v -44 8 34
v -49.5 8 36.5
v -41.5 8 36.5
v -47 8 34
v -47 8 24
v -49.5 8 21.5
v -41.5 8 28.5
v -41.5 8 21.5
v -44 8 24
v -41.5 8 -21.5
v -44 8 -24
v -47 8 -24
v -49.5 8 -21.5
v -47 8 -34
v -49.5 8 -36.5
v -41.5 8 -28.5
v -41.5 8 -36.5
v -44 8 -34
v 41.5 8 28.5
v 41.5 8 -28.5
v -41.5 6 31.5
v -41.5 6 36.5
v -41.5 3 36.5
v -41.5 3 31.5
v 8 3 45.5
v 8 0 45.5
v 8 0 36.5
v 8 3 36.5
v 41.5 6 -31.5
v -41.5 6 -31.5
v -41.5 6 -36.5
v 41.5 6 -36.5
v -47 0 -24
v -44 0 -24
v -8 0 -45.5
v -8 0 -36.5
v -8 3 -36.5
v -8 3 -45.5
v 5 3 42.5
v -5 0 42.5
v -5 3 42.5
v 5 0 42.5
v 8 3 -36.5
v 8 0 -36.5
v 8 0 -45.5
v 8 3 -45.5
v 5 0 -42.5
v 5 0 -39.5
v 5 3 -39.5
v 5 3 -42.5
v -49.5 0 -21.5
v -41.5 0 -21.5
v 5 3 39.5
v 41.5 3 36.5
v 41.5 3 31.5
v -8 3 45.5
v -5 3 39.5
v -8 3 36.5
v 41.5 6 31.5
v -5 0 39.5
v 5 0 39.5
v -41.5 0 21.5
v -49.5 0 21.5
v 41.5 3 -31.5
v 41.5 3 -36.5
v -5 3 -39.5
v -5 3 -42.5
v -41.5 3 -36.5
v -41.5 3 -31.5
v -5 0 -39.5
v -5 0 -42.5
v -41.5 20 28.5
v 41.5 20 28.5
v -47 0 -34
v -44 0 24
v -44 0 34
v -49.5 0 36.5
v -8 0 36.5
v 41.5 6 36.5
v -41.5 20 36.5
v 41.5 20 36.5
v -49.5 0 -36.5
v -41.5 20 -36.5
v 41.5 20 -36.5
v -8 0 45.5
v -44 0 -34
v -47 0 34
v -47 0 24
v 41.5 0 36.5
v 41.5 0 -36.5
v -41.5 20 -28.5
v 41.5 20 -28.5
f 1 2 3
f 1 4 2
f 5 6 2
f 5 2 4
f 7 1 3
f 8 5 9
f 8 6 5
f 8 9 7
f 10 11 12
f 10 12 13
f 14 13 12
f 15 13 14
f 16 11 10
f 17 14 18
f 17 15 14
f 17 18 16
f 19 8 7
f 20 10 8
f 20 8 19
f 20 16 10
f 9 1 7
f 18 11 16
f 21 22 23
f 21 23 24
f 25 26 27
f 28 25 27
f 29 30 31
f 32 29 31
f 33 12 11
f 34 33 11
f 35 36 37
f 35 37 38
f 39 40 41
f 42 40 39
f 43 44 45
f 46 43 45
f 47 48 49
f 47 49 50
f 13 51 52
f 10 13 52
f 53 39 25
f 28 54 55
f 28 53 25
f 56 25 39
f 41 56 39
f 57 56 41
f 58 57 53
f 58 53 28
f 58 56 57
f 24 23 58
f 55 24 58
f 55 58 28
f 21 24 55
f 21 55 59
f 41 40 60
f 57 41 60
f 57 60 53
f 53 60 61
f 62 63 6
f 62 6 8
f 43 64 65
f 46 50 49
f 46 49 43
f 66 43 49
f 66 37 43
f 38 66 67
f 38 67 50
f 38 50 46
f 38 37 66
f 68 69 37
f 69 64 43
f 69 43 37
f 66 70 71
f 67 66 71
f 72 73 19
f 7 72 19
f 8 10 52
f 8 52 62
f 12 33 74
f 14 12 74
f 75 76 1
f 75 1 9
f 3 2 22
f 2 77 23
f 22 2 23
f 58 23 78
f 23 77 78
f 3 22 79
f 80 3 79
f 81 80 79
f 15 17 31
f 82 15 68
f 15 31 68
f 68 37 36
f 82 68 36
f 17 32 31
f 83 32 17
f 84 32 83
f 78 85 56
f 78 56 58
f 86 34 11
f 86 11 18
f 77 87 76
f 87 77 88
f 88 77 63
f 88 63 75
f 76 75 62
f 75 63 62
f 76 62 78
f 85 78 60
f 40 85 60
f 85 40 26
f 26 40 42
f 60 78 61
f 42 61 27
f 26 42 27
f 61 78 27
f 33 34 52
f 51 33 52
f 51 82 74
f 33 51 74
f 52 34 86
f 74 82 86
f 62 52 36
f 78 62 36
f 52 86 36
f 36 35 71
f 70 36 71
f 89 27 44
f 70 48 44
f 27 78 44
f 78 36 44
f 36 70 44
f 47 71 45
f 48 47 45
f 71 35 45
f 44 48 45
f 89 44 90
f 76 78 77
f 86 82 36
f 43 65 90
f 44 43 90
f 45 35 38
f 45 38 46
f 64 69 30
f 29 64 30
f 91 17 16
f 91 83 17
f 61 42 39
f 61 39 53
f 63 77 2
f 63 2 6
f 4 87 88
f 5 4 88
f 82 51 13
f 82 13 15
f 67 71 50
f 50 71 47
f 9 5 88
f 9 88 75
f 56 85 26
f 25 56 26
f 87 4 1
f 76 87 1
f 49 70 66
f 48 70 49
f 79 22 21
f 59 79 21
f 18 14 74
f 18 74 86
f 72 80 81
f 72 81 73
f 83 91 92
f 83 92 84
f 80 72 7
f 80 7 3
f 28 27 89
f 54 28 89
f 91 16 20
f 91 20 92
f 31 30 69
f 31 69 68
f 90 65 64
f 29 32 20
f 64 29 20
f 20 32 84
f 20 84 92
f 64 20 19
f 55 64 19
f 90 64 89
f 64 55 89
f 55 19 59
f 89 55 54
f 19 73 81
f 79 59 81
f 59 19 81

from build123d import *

# Parameters (mm, degrees)
BOSS_EXTRUDE1_DEPTH     = 41.5
SKETCH3_W               = 8
SKETCH3_H               = 15
SKETCH3_W_2             = 3
SKETCH3_H_2             = 10
BOSS_EXTRUDE2_DEPTH     = 8
SKETCH3_3_W             = 16
SKETCH3_3_H             = 9
SKETCH3_3_W_2           = 10
SKETCH3_3_H_2           = 3
BOSS_EXTRUDE3_DEPTH     = 3
CUT_EXTRUDE1_DEPTH      = 104.688234627
CUT_EXTRUDE1_DEPTH_BACK = 83
SKETCH4_W               = 5
SKETCH4_H               = 3


with BuildPart() as part:
    # Sketch2 → Boss-Extrude1 (new, symmetric)
    with BuildSketch(Plane(origin=(0, 0, 0), x_dir=(0, 0, -1), z_dir=(1, 0, 0))):
        Polygon((-28.5, 8), (28.5, 8), (28.5, 20), (36.5, 20), (36.5, 0), (-36.5, 0), (-36.5, 20), (-28.5, 20), align=None)
    extrude(amount=BOSS_EXTRUDE1_DEPTH, both=True)

    # Sketch3 → Boss-Extrude2 (add)
    # profile 1 of 2: a face of its own
    with BuildSketch(Plane(origin=(0, 0, 0), x_dir=(1, 0, 0), z_dir=(0, 1, 0))):
        with Locations((-45.5, -29)):
            Rectangle(SKETCH3_W, SKETCH3_H)
        with Locations((-45.5, -29)):
            Rectangle(SKETCH3_W_2, SKETCH3_H_2, mode=Mode.SUBTRACT)
    # profile 2 of 2: a face of its own
    with BuildSketch(Plane(origin=(0, 0, 0), x_dir=(1, 0, 0), z_dir=(0, 1, 0))):
        with Locations((-45.5, 29)):
            Rectangle(SKETCH3_W, SKETCH3_H)
        with Locations((-45.5, 29)):
            Rectangle(SKETCH3_W_2, SKETCH3_H_2, mode=Mode.SUBTRACT)
    extrude(amount=BOSS_EXTRUDE2_DEPTH)

    # Sketch3<3> → Boss-Extrude3 (add)
    # profile 1 of 2: a face of its own
    with BuildSketch(Plane(origin=(0, 0, 0), x_dir=(1, 0, 0), z_dir=(0, 1, 0))):
        with Locations((0, -41)):
            Rectangle(SKETCH3_3_W, SKETCH3_3_H)
        with Locations((0, -41)):
            Rectangle(SKETCH3_3_W_2, SKETCH3_3_H_2, mode=Mode.SUBTRACT)
    # profile 2 of 2: a face of its own
    with BuildSketch(Plane(origin=(0, 0, 0), x_dir=(1, 0, 0), z_dir=(0, 1, 0))):
        with Locations((0, 41)):
            Rectangle(SKETCH3_3_W, SKETCH3_3_H)
        with Locations((0, 41)):
            Rectangle(SKETCH3_3_W_2, SKETCH3_3_H_2, mode=Mode.SUBTRACT)
    extrude(amount=BOSS_EXTRUDE3_DEPTH)

    # Sketch4 → Cut-Extrude1 (cut, two sides: drawn at the far end of the back side and taken through both)
    with BuildSketch(Plane(origin=(41.5, 0, 0), x_dir=(0, 0, -1), z_dir=(1, 0, 0)).offset(-CUT_EXTRUDE1_DEPTH_BACK)):
        with Locations((-34, 4.5)):
            Rectangle(SKETCH4_W, SKETCH4_H)
        with Locations((34, 4.5)):
            Rectangle(SKETCH4_W, SKETCH4_H)
    extrude(amount=CUT_EXTRUDE1_DEPTH + CUT_EXTRUDE1_DEPTH_BACK, mode=Mode.SUBTRACT)


solid = part.part
